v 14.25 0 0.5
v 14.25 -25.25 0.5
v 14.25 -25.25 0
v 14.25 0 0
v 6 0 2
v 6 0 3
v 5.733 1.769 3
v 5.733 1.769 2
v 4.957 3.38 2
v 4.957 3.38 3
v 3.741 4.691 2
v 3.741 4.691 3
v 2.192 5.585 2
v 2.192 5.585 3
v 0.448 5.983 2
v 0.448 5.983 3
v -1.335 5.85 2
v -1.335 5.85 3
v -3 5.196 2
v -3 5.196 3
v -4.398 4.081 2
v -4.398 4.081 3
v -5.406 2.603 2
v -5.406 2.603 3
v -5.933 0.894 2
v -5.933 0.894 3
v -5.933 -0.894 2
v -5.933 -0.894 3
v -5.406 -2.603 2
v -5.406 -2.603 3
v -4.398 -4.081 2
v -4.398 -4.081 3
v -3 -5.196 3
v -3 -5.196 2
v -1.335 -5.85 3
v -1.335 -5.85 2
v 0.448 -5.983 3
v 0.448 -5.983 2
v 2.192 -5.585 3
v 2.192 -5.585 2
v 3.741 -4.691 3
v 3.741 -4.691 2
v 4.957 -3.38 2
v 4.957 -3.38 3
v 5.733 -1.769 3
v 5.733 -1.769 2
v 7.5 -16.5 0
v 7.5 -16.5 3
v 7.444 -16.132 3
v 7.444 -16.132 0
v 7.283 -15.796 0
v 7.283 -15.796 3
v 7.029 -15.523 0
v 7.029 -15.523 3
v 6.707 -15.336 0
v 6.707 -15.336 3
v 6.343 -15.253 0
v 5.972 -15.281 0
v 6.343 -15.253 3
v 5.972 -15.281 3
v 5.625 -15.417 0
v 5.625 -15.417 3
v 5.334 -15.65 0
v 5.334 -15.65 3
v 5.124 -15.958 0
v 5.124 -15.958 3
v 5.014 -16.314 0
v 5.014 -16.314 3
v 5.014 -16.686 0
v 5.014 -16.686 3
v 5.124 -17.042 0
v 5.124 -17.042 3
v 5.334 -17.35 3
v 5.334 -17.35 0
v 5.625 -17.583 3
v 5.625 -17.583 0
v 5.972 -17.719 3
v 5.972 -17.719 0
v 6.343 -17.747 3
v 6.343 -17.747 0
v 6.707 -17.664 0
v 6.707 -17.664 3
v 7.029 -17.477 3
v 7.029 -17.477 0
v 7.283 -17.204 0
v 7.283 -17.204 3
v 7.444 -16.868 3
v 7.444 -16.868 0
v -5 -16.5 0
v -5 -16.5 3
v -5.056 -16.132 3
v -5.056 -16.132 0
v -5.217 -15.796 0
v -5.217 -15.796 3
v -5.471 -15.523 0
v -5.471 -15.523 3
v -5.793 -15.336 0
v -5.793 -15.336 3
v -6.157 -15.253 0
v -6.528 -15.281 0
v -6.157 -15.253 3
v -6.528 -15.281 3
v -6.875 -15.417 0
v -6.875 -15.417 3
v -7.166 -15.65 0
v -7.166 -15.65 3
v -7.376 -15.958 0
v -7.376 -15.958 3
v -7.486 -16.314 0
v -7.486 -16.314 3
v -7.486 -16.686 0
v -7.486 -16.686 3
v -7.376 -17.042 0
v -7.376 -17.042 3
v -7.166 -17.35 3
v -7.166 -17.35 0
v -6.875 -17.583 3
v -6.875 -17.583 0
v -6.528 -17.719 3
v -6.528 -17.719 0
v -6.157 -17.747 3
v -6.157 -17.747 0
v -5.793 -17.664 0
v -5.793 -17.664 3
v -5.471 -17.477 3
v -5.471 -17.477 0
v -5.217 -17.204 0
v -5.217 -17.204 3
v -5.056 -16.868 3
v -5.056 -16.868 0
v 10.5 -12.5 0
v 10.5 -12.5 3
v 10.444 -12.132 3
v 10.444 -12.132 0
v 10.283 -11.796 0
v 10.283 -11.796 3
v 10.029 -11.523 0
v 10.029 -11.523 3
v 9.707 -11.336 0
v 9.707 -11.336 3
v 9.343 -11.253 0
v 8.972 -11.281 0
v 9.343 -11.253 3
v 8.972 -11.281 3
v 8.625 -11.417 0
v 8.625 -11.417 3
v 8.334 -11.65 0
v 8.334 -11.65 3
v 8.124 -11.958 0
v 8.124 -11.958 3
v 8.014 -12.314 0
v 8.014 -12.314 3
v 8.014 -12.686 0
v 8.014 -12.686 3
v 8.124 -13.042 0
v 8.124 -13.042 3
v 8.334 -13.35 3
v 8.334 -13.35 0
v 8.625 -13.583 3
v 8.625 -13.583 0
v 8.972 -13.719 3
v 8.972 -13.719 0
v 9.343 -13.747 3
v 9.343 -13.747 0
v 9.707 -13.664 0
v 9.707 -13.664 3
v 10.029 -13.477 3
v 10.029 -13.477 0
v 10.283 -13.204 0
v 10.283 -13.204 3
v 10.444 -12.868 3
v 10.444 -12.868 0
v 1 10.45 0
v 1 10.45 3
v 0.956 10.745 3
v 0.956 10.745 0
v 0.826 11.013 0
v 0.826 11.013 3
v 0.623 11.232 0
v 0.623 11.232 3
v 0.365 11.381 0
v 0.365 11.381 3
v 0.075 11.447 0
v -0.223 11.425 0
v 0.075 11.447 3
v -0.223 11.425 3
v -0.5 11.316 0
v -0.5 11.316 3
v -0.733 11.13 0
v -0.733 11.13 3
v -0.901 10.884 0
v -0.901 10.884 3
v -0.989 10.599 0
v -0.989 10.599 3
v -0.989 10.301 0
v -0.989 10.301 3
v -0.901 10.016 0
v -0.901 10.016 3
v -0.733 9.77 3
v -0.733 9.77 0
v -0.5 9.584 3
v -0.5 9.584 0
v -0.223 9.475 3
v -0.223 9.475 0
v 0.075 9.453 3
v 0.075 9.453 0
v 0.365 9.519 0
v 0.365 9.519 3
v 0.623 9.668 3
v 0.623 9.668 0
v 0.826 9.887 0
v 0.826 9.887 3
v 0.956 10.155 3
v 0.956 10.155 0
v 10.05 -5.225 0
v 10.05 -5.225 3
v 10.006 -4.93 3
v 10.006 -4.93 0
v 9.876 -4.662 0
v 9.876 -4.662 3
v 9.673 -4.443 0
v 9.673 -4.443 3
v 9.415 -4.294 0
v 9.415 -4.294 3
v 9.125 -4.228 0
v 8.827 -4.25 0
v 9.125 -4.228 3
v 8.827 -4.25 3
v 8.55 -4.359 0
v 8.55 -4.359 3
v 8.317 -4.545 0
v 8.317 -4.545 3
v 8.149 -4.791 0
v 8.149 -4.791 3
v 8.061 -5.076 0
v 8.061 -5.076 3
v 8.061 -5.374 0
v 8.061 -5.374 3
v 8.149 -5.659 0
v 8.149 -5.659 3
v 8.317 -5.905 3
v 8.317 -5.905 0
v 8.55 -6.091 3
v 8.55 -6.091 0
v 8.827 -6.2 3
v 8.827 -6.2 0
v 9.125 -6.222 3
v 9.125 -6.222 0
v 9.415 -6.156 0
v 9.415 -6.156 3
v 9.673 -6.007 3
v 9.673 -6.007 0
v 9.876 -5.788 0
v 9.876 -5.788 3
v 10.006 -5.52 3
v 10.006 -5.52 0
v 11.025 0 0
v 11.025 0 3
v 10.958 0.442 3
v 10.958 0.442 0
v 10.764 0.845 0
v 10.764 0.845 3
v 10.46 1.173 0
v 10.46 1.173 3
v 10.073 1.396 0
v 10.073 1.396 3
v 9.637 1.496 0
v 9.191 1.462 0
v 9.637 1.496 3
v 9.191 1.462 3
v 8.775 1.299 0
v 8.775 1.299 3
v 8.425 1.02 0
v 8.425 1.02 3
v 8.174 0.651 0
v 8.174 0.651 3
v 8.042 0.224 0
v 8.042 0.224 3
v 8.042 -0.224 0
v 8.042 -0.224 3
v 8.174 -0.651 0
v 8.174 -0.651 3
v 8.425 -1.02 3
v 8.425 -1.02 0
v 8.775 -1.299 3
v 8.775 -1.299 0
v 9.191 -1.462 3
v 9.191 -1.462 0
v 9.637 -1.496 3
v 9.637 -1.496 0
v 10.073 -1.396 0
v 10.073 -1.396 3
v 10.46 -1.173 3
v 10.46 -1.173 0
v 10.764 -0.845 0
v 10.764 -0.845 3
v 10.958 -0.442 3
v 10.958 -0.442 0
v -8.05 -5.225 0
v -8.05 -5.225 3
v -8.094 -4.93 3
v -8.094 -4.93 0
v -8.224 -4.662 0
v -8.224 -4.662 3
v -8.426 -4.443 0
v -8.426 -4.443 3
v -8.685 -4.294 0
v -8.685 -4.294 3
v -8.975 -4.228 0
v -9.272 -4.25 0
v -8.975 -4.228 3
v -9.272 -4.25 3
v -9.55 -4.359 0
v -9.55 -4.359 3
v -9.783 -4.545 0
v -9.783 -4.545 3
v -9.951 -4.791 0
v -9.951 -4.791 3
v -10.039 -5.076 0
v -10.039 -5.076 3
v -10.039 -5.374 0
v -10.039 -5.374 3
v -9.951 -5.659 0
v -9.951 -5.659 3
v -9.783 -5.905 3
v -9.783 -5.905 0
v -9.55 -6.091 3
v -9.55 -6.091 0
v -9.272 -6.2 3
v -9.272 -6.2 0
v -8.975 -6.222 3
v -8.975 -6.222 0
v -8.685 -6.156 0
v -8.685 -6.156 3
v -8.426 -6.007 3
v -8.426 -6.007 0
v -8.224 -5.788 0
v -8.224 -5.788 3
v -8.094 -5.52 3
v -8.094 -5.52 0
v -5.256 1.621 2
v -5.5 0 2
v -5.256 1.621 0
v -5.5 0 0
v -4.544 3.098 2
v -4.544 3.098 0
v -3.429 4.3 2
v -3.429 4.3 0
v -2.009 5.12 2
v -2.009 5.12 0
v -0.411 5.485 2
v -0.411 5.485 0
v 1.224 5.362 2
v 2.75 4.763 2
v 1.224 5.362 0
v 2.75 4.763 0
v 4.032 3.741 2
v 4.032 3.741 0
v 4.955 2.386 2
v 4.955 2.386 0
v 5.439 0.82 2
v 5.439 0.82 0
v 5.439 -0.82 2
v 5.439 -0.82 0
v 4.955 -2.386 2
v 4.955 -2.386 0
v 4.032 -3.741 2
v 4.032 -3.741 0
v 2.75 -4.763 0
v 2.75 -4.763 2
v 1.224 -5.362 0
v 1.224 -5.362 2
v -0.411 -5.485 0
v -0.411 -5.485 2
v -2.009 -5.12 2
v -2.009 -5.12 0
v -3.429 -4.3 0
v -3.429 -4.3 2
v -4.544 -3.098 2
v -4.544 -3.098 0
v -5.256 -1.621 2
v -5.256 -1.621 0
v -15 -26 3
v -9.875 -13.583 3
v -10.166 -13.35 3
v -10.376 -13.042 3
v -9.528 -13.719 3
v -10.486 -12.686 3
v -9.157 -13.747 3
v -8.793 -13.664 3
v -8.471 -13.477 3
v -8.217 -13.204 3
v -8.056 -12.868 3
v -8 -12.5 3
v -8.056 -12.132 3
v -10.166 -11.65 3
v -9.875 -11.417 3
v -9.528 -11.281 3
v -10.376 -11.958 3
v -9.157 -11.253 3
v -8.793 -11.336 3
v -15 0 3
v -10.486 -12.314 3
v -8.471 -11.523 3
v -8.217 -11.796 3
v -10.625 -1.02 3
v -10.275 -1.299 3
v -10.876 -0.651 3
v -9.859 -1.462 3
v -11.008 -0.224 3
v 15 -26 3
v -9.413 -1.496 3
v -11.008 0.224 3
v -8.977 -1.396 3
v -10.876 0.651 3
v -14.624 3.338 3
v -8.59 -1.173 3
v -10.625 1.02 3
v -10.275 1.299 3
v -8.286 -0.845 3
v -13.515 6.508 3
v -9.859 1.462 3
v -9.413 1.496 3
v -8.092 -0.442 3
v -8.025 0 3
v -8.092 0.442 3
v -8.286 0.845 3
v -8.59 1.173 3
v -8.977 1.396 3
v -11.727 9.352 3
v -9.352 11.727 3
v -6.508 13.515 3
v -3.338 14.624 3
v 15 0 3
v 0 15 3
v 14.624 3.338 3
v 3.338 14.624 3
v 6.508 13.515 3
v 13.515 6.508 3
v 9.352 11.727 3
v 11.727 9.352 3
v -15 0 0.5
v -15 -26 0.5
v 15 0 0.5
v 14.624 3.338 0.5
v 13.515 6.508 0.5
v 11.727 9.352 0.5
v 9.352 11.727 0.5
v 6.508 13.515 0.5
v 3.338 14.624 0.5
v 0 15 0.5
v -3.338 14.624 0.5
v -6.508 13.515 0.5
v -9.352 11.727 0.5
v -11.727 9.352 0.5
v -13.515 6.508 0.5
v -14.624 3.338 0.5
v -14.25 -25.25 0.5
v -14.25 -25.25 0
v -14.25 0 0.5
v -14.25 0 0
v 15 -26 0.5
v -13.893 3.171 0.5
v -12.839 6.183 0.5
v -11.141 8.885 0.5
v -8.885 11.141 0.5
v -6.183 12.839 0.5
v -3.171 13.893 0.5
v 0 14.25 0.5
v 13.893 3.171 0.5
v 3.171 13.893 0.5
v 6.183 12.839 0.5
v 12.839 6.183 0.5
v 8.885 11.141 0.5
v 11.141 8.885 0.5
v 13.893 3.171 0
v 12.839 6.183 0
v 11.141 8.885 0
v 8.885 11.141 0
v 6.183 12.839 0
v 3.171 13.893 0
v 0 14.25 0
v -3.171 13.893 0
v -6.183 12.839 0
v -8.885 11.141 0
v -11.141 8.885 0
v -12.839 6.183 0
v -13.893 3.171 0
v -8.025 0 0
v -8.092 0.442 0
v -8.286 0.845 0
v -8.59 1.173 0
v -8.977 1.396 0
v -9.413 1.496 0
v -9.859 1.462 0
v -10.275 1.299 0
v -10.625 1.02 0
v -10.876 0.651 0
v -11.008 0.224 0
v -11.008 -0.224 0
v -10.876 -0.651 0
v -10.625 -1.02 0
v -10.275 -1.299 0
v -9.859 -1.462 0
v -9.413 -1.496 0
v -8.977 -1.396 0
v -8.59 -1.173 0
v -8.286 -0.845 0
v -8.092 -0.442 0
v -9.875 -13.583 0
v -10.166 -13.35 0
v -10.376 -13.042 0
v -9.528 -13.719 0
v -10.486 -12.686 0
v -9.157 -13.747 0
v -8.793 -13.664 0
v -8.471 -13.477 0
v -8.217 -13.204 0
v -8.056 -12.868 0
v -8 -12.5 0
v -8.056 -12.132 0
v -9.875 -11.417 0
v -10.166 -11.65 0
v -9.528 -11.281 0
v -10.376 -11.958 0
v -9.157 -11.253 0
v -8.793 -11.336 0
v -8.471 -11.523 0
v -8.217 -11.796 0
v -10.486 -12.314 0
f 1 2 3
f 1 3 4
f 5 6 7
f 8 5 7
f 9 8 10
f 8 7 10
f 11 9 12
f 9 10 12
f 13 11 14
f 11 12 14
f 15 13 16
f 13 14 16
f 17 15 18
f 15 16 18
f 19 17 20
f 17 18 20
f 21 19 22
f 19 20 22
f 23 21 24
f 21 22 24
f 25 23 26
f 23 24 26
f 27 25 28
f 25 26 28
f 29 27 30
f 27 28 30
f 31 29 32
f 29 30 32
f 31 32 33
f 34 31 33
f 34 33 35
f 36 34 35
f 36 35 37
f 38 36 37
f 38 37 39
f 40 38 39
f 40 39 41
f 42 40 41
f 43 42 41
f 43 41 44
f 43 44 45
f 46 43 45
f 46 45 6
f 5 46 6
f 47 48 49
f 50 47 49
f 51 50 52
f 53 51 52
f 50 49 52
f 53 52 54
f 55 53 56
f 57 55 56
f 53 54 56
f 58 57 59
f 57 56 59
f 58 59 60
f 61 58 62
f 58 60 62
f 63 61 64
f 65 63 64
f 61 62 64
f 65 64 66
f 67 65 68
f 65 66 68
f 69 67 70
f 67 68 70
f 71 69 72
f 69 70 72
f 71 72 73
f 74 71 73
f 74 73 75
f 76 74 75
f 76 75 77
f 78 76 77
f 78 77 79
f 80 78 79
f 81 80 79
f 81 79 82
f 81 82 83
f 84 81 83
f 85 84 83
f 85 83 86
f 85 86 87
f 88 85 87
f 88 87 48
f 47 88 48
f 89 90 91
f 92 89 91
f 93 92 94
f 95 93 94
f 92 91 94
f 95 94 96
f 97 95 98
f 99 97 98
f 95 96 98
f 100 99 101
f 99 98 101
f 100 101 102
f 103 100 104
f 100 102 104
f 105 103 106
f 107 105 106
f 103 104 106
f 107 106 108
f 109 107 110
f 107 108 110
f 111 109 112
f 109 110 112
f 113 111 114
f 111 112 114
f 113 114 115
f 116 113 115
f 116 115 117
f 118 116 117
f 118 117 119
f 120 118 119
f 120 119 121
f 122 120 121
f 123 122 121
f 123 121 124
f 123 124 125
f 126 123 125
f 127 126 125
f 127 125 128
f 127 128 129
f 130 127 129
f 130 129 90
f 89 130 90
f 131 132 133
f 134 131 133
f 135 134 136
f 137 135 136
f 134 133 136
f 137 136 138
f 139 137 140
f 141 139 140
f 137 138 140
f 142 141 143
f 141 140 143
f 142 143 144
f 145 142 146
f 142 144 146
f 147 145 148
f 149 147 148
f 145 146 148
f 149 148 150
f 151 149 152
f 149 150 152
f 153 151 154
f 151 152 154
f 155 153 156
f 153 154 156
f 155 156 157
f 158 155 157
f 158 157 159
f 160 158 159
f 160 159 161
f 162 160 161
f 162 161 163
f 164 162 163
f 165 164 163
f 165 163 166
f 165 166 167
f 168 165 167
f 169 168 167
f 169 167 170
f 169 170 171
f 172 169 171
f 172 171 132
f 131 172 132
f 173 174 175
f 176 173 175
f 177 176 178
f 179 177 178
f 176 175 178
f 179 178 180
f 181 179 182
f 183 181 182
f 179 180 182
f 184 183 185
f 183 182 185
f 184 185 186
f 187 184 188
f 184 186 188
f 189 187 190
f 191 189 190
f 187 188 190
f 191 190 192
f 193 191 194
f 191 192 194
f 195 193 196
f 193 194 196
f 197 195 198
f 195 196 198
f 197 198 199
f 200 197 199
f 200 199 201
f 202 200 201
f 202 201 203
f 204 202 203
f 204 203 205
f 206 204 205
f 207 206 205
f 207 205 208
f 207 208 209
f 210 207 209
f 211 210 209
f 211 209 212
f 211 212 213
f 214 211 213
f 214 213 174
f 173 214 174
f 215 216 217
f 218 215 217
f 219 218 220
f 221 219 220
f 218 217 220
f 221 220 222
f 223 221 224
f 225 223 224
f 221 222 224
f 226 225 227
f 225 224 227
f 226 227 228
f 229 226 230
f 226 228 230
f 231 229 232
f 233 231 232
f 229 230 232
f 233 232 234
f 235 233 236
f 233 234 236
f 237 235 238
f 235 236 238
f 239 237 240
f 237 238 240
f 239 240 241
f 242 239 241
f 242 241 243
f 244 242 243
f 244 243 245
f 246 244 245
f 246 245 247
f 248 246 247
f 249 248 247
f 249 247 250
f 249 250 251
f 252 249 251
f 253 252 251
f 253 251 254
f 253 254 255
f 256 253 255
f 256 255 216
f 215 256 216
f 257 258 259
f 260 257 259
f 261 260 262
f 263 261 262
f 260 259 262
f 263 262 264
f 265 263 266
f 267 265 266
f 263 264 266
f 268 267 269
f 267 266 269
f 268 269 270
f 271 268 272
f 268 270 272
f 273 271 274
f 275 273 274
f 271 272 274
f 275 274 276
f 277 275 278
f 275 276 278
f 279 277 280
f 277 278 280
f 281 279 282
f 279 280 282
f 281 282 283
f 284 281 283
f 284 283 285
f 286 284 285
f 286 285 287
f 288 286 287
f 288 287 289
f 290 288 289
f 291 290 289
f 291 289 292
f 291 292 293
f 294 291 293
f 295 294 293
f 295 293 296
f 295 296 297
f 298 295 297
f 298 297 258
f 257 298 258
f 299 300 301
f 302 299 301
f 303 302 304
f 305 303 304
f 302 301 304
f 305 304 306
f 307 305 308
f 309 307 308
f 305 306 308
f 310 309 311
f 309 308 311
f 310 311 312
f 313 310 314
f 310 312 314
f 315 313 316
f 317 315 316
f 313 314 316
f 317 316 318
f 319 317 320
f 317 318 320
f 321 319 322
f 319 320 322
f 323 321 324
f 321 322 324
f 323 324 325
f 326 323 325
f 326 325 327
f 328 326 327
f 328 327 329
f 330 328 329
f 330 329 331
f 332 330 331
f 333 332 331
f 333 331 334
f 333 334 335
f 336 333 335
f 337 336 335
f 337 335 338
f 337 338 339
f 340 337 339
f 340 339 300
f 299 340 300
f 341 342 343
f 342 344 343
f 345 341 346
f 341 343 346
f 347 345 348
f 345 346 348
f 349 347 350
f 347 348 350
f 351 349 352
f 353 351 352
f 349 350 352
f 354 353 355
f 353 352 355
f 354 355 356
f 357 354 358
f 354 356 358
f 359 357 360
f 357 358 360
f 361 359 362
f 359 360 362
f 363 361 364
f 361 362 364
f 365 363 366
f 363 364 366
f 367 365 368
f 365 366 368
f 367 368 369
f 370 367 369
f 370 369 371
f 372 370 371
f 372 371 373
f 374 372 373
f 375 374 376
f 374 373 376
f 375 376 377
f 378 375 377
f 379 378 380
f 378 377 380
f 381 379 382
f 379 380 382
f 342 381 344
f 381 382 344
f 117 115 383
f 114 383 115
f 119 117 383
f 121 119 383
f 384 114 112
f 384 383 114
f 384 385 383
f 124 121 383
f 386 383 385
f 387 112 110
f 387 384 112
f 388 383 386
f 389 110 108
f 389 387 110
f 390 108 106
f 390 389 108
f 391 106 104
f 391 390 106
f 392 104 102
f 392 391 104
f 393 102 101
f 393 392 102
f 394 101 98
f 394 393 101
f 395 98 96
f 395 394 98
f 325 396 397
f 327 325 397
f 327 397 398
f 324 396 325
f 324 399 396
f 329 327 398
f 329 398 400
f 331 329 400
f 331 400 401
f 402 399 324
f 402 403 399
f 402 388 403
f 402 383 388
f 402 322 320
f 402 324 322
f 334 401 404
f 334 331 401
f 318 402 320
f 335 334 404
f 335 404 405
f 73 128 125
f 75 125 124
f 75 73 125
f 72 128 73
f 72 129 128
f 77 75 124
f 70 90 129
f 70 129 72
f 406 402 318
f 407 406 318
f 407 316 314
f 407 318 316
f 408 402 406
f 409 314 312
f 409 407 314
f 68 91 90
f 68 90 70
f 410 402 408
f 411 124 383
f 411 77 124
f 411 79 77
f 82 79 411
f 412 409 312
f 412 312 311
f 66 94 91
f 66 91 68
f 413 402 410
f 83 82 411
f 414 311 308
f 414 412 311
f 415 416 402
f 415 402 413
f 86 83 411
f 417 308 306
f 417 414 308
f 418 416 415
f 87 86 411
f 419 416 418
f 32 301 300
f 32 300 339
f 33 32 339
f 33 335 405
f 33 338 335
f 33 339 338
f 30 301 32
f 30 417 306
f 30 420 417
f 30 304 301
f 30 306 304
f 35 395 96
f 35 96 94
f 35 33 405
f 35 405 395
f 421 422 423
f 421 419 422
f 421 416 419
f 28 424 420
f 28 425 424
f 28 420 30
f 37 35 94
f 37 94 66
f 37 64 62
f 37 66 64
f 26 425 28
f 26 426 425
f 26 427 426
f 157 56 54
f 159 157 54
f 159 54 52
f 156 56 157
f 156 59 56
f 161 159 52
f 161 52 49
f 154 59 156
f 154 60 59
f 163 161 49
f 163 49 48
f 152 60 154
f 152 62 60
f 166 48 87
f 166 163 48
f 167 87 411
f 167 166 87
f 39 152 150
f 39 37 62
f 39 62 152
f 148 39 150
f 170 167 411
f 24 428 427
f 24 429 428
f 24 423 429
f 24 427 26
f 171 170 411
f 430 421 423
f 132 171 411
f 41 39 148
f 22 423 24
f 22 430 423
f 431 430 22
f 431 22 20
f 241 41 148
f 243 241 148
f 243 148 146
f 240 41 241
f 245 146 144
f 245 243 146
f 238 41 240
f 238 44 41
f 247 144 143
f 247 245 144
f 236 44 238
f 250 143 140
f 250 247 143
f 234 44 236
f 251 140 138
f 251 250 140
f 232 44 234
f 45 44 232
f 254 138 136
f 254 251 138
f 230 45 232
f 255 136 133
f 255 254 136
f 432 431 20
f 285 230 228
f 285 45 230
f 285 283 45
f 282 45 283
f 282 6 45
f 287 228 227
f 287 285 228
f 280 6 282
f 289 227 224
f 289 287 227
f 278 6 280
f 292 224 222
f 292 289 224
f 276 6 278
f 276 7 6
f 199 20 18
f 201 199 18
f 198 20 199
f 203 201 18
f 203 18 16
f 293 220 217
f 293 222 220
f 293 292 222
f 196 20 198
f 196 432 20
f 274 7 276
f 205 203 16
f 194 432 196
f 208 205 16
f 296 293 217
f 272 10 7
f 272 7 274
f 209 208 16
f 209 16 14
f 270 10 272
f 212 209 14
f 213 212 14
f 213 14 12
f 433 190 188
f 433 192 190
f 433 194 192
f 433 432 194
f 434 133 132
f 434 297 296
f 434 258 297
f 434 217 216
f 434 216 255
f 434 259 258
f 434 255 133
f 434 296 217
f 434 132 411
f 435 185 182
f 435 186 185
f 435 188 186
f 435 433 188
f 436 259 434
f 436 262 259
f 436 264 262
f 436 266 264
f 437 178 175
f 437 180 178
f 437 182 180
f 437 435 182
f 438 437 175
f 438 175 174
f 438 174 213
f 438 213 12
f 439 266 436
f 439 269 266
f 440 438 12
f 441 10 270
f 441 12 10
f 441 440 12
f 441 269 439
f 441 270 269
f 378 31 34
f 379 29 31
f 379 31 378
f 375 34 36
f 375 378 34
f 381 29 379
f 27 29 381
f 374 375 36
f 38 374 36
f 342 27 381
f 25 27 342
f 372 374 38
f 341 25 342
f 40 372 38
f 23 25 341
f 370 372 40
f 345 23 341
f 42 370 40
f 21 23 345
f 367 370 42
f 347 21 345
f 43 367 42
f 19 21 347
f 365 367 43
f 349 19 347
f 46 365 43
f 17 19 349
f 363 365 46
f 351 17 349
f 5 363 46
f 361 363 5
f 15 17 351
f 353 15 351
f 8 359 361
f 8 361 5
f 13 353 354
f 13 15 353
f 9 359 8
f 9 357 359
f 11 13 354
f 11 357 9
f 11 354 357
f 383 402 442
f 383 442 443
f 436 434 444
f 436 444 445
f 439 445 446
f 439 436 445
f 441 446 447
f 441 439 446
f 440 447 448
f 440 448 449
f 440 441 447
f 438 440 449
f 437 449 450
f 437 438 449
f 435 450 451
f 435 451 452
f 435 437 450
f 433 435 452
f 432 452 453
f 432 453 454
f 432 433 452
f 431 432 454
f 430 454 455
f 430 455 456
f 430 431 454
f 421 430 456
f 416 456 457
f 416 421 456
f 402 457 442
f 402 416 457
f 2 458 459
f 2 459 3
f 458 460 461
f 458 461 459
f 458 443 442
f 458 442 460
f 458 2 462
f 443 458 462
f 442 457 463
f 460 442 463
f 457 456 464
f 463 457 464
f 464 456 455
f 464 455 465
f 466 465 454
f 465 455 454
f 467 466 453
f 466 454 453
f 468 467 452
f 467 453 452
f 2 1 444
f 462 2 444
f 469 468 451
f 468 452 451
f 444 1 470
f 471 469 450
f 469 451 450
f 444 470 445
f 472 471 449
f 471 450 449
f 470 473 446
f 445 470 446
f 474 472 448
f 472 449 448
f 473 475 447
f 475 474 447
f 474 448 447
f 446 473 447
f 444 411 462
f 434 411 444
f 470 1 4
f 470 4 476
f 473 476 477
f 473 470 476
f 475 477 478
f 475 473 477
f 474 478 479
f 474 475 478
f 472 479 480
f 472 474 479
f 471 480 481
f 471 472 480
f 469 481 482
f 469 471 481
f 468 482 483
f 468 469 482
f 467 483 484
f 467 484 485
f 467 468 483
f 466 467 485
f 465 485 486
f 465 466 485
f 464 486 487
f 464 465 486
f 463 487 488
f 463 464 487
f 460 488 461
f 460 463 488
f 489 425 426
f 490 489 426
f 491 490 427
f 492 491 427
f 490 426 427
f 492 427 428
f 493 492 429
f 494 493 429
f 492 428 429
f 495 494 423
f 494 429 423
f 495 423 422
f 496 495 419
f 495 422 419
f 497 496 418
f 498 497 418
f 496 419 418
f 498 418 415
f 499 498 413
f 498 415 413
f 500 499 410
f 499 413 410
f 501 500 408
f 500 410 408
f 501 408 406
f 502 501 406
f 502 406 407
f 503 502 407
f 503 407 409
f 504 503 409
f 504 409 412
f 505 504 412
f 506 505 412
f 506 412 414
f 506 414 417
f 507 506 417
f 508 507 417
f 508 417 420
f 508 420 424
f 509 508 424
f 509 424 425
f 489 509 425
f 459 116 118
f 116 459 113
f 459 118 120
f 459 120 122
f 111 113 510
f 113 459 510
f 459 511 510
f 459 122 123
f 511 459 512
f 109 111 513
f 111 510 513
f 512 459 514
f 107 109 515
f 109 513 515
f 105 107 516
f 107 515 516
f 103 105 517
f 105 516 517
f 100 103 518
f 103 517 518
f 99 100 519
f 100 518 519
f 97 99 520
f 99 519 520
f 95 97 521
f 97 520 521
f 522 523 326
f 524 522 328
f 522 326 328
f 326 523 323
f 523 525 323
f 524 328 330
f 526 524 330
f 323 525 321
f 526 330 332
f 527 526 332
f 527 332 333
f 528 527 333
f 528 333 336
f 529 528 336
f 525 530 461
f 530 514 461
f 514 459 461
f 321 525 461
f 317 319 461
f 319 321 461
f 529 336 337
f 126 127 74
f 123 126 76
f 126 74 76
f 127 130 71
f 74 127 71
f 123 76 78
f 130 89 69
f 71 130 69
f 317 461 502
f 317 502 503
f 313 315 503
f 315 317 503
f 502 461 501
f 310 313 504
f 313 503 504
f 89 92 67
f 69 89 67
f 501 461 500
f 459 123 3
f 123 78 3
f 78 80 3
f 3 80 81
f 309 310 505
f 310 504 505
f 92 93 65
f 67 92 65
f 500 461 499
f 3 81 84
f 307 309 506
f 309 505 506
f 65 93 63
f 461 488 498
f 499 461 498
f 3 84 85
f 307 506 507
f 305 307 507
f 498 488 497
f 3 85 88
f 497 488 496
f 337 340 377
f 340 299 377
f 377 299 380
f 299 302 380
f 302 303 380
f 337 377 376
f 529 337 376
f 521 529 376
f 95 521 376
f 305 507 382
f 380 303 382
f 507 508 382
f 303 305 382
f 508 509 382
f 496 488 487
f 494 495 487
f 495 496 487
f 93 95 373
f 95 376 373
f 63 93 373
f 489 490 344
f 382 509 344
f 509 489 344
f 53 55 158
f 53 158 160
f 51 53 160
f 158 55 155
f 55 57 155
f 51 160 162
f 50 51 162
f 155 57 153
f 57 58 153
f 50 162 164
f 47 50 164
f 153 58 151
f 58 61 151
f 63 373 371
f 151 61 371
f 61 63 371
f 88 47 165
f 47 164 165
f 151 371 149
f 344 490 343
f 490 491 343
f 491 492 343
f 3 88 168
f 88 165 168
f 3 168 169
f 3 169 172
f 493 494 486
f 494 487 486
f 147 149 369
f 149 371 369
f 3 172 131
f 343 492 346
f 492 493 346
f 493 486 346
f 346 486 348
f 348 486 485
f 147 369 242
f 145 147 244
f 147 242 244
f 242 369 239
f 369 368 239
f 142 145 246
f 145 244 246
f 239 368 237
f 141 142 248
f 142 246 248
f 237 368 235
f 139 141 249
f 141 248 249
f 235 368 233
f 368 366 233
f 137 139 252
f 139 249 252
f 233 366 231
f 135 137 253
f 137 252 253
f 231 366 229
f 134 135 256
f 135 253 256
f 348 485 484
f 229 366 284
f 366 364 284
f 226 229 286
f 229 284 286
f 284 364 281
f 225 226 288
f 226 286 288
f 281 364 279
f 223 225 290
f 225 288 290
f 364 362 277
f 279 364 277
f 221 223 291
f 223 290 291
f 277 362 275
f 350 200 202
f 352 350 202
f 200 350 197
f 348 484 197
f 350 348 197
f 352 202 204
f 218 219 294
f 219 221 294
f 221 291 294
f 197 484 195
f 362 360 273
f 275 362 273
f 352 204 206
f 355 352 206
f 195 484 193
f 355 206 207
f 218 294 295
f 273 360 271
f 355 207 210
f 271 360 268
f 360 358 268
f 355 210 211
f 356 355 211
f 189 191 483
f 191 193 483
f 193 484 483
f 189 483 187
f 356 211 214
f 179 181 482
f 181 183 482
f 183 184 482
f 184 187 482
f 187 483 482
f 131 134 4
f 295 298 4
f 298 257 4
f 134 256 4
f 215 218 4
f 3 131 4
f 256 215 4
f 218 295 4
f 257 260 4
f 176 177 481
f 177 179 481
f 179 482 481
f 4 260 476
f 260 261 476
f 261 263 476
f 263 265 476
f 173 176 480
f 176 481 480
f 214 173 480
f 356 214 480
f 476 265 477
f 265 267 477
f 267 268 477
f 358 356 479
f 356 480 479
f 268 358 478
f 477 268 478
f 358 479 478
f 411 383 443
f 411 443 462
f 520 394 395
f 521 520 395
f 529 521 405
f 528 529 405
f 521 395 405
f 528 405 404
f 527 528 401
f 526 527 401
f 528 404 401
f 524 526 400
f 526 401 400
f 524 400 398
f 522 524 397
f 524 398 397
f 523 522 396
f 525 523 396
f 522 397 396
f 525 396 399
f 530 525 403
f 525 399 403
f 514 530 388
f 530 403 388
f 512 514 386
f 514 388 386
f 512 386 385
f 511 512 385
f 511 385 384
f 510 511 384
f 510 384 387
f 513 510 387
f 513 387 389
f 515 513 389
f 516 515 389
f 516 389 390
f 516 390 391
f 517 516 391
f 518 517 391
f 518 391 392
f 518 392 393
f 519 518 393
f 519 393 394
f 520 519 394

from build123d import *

# Parameters (mm, degrees)
BOSS_EXTRUDE1_DEPTH                      = 2.5
BOSS_EXTRUDE2_DEPTH                      = 0.5
F_2_5_2_5_DIAMETER_HOLE1_D               = 2.5
F_3_0_3_DIAMETER_HOLE1_D                 = 3
F_2_0_2_DIAMETER_HOLE1_D                 = 2
CBORE_FOR_M10_HEX_HEAD_BOLT1_D           = 11
CBORE_FOR_M10_HEX_HEAD_BOLT1_CBORE_D     = 12
CBORE_FOR_M10_HEX_HEAD_BOLT1_CBORE_DEPTH = 1


with BuildPart() as part:
    # Sketch1 → Boss-Extrude1 (new body)
    with BuildSketch(Plane.XY.offset(3)):
        with BuildLine():
            Line((-15, 0), (-15, -26))
            Line((-15, -26), (15, -26))
            Line((15, -26), (15, 0))
            ThreePointArc((15, 0), (0, 15), (-15, 0))
        make_face()
    extrude(amount=-BOSS_EXTRUDE1_DEPTH)

    # Sketch2 → Boss-Extrude2 (add)
    with BuildSketch(Plane(origin=(0, 0, 0.5), x_dir=(-1, 0, 0), z_dir=(0, 0, -1))):
        with BuildLine():
            Line((-14.25, -25.25), (-14.25, 0))
            ThreePointArc((-14.25, 0), (0, 14.25), (14.25, 0))
            Line((14.25, 0), (14.25, -25.25))
            Line((14.25, -25.25), (-14.25, -25.25))
        make_face()
    extrude(amount=BOSS_EXTRUDE2_DEPTH)

    # Ø2.5 (2.5) Diameter Hole1 (through all)
    with Locations(Plane(origin=(0, 0, 0), x_dir=(-1, 0, 0), z_dir=(0, 0, -1))):
        with Locations((9.25, -12.5), (-9.25, -12.5), (6.25, -16.5), (-6.25, -16.5)):
            Hole(F_2_5_2_5_DIAMETER_HOLE1_D / 2)

    # Ø3.0 (3) Diameter Hole1 (through all)
    with Locations(Plane(origin=(0, 0, 0), x_dir=(-1, 0, 0), z_dir=(0, 0, -1))):
        with Locations((-9.525, 0), (9.525, 0)):
            Hole(F_3_0_3_DIAMETER_HOLE1_D / 2)

    # Ø2.0 (2) Diameter Hole1 (through all)
    with Locations(Plane(origin=(0, 0, 0), x_dir=(-1, 0, 0), z_dir=(0, 0, -1))):
        with Locations((0, 10.45), (9.04996547, -5.225), (-9.04996547, -5.225)):
            Hole(F_2_0_2_DIAMETER_HOLE1_D / 2)

    # CBORE for M10 Hex Head Bolt1 (through all)
    with Locations(Plane.XY.offset(3)):
        with Locations((0, 0)):
            CounterBoreHole(CBORE_FOR_M10_HEX_HEAD_BOLT1_D / 2, CBORE_FOR_M10_HEX_HEAD_BOLT1_CBORE_D / 2, CBORE_FOR_M10_HEX_HEAD_BOLT1_CBORE_DEPTH)


solid = part.part
